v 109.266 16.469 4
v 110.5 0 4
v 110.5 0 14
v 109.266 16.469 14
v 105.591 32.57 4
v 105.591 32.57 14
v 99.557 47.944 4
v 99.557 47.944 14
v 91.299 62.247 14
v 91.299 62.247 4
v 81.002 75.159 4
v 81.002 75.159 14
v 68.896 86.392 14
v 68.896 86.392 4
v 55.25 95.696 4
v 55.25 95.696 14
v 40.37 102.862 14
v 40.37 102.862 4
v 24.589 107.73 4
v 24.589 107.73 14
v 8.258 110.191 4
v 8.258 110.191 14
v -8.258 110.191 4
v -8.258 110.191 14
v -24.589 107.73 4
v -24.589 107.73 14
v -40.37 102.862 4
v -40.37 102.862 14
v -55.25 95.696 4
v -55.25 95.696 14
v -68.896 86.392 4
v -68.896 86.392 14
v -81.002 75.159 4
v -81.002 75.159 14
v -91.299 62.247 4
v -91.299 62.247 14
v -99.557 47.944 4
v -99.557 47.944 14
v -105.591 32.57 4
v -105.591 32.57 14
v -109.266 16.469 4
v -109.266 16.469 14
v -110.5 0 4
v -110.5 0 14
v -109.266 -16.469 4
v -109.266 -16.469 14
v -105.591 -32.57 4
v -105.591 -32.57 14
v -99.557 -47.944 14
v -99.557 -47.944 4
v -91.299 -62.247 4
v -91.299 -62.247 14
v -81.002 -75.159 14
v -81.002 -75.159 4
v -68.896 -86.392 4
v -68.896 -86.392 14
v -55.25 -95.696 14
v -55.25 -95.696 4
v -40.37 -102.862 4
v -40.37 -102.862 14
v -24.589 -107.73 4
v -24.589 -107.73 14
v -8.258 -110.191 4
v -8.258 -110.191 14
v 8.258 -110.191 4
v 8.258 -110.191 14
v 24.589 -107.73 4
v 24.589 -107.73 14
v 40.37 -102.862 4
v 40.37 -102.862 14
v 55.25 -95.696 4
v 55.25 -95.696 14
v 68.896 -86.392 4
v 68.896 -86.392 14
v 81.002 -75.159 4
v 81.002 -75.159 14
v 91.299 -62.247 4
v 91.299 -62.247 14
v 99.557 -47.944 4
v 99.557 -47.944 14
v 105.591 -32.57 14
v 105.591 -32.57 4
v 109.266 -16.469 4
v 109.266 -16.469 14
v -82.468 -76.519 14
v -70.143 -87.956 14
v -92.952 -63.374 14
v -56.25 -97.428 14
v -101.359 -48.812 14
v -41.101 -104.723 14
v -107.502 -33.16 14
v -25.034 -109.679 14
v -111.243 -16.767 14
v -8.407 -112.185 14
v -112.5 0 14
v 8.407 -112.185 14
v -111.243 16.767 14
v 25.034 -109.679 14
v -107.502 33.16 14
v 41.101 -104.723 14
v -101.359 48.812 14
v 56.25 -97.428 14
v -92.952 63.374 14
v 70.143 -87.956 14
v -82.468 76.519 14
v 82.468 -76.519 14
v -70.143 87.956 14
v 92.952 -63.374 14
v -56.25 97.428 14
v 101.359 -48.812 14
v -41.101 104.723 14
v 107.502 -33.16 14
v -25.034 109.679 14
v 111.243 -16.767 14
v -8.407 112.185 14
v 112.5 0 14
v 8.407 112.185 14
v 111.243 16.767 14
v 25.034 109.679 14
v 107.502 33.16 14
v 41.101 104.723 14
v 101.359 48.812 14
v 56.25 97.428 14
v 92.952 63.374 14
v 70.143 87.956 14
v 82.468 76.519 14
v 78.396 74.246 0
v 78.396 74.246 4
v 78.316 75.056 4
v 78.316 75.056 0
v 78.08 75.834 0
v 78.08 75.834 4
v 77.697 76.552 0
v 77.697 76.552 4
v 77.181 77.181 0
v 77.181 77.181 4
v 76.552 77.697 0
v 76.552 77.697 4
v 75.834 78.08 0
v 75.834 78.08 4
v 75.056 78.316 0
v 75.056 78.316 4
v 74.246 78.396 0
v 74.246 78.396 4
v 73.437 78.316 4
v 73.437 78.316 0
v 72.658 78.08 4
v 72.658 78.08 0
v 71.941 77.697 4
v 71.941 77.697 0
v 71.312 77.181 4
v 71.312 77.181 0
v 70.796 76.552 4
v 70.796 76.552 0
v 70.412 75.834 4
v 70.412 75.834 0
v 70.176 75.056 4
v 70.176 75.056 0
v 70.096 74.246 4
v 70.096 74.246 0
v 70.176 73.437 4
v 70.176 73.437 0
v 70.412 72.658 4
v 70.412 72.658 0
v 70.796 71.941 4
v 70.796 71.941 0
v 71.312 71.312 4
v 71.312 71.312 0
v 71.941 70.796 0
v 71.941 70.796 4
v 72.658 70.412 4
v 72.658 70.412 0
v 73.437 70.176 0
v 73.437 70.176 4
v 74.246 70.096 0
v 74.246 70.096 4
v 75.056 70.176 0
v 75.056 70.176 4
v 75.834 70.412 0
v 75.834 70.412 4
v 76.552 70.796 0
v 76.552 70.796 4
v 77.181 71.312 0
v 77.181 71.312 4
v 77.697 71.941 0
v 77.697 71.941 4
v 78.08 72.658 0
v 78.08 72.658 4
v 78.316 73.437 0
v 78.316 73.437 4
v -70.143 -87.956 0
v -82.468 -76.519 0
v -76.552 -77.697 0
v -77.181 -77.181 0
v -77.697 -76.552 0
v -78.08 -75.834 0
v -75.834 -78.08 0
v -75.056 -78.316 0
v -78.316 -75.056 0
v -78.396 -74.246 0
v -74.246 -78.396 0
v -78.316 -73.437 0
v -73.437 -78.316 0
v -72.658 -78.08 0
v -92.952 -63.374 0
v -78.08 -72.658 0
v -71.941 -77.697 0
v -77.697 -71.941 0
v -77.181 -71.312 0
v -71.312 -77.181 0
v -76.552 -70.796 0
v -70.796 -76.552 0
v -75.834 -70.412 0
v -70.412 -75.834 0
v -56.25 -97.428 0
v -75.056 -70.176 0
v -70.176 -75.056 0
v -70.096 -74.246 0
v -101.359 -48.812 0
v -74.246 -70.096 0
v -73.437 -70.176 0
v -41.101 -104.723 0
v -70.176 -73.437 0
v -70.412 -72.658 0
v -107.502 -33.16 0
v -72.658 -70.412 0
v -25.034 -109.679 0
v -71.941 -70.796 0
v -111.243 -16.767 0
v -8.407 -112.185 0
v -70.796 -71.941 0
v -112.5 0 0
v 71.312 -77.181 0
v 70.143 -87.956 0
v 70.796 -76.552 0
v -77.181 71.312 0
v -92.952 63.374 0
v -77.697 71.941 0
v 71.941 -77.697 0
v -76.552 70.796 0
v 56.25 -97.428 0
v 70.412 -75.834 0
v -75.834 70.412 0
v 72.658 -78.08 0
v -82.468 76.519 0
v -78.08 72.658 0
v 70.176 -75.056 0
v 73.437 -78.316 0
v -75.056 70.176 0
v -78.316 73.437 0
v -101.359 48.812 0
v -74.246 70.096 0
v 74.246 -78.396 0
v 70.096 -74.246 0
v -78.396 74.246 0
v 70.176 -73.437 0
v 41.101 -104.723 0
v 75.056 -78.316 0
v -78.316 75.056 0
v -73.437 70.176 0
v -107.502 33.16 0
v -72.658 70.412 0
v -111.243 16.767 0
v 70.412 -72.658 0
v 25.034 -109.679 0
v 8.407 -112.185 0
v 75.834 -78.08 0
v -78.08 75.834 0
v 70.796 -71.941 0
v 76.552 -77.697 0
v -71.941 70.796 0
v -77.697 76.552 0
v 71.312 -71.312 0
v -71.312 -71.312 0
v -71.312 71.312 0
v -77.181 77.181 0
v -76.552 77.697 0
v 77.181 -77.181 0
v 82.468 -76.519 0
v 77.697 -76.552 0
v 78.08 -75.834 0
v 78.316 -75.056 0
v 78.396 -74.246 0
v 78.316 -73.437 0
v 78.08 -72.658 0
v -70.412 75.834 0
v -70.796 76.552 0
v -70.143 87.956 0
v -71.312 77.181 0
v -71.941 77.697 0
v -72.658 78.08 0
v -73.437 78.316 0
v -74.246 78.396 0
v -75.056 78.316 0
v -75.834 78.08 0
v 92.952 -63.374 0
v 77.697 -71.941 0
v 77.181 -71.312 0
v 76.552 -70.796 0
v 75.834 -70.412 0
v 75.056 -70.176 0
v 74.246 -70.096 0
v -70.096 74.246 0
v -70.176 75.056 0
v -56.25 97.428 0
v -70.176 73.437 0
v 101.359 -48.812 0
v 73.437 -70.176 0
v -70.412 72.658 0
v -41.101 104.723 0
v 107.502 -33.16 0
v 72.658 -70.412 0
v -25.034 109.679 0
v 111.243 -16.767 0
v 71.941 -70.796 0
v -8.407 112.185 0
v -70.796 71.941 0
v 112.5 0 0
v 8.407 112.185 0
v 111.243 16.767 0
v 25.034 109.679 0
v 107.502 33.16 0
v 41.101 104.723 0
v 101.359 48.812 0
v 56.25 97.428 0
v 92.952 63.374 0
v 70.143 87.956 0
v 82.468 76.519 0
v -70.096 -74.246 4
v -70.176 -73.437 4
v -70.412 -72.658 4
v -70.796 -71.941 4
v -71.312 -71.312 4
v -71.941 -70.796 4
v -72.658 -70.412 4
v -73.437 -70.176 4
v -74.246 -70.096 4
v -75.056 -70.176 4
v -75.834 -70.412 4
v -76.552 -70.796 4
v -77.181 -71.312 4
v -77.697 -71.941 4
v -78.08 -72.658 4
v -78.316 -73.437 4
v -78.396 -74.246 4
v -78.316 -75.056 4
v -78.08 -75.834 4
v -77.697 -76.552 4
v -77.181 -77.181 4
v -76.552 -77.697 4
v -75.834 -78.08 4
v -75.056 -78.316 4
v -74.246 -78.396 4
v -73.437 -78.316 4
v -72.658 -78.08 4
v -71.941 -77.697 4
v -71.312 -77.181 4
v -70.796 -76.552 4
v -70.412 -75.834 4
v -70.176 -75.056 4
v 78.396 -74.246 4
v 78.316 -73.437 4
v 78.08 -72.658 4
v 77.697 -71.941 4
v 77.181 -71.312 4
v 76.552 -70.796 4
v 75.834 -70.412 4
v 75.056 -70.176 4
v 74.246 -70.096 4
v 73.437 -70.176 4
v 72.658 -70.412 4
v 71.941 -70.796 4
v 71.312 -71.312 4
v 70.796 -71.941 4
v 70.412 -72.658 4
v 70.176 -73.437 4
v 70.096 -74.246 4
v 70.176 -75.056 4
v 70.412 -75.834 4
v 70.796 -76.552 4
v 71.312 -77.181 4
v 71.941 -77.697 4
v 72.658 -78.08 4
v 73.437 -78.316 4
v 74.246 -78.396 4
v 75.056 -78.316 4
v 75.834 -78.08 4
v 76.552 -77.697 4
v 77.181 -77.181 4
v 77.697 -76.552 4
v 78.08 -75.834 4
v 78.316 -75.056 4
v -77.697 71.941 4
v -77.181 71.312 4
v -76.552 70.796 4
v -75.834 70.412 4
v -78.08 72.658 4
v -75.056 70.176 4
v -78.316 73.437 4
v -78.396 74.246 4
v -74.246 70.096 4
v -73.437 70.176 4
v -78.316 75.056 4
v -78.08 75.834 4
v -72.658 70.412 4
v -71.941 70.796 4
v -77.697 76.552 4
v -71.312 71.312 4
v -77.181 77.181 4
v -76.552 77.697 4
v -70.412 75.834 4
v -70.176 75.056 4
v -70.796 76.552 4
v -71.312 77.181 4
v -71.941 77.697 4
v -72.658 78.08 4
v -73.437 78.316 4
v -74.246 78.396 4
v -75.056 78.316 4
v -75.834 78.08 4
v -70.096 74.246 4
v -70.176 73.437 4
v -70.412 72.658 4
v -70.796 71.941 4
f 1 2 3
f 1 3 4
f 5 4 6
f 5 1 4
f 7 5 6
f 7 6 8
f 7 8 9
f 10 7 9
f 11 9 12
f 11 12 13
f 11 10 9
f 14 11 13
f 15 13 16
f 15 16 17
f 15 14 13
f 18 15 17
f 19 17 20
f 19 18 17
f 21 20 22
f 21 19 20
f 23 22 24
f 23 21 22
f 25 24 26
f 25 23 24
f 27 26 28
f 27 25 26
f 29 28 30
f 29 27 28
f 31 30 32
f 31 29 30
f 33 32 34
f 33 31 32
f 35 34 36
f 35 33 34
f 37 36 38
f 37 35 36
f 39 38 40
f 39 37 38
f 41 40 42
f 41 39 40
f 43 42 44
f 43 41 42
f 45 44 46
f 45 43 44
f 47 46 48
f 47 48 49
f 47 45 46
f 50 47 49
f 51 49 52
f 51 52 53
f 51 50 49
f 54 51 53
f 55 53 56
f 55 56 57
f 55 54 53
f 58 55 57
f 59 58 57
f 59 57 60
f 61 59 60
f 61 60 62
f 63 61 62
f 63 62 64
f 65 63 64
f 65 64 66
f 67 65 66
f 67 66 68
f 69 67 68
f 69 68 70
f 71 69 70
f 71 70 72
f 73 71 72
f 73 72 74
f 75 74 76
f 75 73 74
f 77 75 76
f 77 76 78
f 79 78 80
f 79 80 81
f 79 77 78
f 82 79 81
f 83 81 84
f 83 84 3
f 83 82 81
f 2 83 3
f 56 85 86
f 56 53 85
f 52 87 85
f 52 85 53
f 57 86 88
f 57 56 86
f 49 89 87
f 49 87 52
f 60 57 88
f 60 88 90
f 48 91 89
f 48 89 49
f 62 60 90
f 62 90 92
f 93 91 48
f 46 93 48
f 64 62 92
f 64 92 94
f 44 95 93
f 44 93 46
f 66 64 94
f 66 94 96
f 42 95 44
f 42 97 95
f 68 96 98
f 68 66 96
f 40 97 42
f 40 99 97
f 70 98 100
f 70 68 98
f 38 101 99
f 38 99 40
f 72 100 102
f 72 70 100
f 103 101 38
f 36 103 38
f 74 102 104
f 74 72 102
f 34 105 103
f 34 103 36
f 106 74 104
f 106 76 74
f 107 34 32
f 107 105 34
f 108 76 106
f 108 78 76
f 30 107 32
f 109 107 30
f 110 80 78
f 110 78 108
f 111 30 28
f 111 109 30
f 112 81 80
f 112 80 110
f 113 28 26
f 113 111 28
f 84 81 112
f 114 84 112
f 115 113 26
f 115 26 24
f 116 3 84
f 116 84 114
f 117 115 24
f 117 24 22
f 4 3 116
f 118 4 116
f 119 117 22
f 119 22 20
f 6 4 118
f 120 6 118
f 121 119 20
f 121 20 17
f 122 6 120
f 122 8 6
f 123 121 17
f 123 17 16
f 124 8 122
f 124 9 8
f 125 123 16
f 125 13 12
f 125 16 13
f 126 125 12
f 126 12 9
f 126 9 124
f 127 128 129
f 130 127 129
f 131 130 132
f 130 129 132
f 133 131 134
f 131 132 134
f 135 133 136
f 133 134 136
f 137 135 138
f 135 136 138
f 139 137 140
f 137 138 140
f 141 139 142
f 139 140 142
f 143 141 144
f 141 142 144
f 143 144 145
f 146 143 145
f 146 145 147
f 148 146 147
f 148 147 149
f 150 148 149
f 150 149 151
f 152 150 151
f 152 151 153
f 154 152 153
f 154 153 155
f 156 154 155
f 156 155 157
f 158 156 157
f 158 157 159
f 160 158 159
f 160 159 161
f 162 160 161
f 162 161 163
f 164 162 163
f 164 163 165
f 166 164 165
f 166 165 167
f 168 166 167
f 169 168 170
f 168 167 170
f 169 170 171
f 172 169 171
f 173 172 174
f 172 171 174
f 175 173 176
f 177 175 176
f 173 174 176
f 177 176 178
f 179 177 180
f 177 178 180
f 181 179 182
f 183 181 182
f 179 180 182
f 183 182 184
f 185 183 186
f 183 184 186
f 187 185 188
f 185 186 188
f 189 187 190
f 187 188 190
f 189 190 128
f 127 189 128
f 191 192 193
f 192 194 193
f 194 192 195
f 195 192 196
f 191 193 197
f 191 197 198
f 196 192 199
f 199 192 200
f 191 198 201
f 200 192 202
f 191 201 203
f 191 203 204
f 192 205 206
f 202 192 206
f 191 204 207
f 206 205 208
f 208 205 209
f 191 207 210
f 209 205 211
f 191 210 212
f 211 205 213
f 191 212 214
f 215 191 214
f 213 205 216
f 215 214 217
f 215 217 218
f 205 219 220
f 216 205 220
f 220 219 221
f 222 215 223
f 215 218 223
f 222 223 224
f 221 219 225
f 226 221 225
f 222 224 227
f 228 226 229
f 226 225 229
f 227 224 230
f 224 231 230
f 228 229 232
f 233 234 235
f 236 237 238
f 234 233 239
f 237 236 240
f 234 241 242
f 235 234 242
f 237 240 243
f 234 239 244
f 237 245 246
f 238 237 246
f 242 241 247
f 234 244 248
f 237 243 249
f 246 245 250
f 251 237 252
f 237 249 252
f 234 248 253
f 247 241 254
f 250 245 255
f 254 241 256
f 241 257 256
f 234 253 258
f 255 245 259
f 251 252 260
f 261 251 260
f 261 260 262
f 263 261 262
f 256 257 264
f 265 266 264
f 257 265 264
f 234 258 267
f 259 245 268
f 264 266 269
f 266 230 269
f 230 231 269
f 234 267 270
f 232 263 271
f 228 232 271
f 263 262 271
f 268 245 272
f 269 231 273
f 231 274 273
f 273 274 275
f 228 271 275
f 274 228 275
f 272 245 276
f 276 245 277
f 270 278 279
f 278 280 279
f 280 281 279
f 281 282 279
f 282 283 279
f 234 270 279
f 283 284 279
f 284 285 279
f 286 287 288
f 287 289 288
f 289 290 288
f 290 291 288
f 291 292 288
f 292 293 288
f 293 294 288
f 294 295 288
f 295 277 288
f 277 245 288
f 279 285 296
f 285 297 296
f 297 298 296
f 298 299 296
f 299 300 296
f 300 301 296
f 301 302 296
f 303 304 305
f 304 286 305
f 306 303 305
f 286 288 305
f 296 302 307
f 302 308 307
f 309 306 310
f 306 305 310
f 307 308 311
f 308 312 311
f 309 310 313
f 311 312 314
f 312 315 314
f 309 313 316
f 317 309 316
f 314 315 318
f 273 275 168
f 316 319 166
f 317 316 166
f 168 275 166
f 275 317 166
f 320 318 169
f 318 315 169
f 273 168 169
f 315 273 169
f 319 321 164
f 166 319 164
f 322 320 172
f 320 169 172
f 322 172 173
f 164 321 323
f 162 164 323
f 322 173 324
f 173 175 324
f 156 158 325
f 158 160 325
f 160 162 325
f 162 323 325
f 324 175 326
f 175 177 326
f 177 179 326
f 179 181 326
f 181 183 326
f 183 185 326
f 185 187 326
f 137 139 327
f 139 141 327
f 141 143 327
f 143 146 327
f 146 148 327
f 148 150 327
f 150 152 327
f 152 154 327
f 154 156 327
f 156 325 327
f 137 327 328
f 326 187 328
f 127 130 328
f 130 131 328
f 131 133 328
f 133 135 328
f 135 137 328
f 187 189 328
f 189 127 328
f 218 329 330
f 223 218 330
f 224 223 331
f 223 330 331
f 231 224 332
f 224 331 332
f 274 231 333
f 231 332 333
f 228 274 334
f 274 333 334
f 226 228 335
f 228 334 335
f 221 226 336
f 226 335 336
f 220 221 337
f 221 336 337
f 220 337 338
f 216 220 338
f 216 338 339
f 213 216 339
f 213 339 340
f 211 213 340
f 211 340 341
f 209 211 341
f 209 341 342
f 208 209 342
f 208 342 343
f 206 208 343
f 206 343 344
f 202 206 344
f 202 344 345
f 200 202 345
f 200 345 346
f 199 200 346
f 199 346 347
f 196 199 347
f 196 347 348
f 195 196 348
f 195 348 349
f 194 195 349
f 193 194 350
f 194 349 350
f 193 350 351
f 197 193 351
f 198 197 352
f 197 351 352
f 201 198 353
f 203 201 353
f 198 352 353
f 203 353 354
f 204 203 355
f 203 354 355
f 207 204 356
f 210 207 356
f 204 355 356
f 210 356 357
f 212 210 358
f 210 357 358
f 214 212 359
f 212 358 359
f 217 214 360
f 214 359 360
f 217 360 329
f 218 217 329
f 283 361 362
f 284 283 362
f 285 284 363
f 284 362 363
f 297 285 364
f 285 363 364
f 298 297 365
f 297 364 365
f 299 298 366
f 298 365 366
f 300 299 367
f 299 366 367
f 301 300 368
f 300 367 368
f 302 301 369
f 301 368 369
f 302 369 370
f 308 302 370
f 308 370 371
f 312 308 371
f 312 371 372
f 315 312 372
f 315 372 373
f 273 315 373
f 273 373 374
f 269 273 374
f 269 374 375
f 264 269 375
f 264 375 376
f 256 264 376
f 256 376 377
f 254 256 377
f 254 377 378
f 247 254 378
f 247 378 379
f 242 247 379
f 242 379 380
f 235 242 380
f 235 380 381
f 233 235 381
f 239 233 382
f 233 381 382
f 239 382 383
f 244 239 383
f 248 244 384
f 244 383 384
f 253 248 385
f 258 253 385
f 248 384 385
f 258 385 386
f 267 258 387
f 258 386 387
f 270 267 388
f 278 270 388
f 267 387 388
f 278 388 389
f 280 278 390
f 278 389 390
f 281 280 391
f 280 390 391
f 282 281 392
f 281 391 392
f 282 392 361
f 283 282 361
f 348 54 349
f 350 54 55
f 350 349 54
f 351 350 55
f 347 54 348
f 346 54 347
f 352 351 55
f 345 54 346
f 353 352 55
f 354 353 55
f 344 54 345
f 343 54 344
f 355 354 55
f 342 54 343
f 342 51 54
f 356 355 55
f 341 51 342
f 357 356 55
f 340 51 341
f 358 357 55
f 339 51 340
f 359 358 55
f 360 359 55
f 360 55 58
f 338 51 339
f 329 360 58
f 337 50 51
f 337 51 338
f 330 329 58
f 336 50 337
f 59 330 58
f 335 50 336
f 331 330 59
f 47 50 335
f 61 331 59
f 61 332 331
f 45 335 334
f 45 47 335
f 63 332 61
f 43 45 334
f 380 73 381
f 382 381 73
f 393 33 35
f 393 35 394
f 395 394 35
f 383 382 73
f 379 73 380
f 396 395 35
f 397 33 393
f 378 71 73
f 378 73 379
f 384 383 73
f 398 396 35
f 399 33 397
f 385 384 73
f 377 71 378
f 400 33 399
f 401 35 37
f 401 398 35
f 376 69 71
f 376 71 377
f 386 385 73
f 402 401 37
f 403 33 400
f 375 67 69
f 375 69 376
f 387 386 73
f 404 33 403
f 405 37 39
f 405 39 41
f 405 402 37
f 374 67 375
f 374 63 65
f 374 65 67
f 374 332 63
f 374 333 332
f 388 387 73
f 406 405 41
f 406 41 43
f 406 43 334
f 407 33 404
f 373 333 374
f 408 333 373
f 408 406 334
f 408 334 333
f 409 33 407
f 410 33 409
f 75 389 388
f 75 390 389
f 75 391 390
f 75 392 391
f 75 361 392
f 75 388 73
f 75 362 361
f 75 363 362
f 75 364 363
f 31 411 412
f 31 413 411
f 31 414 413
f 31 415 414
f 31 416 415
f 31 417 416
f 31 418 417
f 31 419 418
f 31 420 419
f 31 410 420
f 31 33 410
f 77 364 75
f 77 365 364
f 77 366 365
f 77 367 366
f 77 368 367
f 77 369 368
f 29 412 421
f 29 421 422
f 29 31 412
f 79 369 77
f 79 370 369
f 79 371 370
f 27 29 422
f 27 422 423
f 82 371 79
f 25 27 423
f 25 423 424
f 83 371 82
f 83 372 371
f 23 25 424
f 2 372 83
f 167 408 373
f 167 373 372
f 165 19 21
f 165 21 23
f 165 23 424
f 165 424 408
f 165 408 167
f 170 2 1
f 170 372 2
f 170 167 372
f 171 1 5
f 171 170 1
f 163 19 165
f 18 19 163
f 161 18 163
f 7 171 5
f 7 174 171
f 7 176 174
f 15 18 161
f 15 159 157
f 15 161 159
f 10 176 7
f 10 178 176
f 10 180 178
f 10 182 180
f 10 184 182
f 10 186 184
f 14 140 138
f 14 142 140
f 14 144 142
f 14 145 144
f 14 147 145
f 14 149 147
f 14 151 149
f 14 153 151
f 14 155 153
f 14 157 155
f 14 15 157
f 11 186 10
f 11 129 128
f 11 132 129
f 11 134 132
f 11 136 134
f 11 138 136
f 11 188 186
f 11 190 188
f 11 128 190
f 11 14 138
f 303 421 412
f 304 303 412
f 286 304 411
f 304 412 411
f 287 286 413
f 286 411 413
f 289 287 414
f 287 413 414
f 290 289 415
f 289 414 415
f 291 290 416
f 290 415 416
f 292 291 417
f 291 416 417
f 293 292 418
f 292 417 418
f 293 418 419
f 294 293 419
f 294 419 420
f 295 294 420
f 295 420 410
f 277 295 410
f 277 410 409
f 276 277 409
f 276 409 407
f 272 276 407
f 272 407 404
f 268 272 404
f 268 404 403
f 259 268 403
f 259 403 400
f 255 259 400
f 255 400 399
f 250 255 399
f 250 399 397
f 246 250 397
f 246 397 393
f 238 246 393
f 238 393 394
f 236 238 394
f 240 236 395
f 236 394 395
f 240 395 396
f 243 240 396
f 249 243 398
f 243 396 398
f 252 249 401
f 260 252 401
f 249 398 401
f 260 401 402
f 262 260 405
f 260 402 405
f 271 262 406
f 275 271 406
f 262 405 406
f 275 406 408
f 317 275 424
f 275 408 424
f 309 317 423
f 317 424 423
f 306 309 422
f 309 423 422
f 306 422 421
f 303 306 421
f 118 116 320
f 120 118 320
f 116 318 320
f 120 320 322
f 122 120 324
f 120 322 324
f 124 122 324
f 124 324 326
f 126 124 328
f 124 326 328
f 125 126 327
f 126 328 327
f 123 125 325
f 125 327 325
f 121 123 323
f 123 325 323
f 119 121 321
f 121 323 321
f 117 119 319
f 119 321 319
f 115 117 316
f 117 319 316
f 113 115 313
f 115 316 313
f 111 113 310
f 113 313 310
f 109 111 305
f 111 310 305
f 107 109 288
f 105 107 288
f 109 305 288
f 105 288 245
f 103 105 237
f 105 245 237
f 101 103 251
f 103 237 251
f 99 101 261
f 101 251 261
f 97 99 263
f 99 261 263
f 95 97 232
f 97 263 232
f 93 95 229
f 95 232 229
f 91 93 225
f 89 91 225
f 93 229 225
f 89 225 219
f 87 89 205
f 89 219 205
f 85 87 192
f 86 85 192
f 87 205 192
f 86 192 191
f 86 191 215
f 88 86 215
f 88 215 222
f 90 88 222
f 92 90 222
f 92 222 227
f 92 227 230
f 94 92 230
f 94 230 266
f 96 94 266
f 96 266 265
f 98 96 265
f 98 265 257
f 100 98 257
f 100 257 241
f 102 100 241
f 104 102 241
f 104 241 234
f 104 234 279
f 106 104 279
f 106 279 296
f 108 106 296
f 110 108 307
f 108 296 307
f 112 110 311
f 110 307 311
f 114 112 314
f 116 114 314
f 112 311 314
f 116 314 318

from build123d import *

# Parameters (mm, degrees)
F0_R     = 112.5
F1_DEPTH = 4
F2_R     = 4.15
F3_DEPTH = 25
F4_R     = 112.5
F4_R_2   = 110.5
F5_DEPTH = 10


with BuildPart() as f1:
    # F0 (on Top) → F1 (new body)
    with BuildSketch(Plane.XY):
        Circle(F0_R)
    extrude(amount=F1_DEPTH)

    # F2 (on face) → F3 (cut)
    with BuildSketch(Plane.XY.offset(4)):
        with Locations((-74.2462, 74.2462)):
            Circle(F2_R)
        with Locations((-74.2462, -74.2462)):
            Circle(F2_R)
        with Locations((74.2462, -74.2462)):
            Circle(F2_R)
        with Locations((74.2462, 74.2462)):
            Circle(F2_R)
    extrude(amount=-F3_DEPTH, mode=Mode.SUBTRACT)

    # F4 (on face) → F5 (join)
    with BuildSketch(Plane.XY.offset(4)):
        Circle(F4_R)
        Circle(F4_R_2, mode=Mode.SUBTRACT)
    extrude(amount=F5_DEPTH)


solid = f1.part
